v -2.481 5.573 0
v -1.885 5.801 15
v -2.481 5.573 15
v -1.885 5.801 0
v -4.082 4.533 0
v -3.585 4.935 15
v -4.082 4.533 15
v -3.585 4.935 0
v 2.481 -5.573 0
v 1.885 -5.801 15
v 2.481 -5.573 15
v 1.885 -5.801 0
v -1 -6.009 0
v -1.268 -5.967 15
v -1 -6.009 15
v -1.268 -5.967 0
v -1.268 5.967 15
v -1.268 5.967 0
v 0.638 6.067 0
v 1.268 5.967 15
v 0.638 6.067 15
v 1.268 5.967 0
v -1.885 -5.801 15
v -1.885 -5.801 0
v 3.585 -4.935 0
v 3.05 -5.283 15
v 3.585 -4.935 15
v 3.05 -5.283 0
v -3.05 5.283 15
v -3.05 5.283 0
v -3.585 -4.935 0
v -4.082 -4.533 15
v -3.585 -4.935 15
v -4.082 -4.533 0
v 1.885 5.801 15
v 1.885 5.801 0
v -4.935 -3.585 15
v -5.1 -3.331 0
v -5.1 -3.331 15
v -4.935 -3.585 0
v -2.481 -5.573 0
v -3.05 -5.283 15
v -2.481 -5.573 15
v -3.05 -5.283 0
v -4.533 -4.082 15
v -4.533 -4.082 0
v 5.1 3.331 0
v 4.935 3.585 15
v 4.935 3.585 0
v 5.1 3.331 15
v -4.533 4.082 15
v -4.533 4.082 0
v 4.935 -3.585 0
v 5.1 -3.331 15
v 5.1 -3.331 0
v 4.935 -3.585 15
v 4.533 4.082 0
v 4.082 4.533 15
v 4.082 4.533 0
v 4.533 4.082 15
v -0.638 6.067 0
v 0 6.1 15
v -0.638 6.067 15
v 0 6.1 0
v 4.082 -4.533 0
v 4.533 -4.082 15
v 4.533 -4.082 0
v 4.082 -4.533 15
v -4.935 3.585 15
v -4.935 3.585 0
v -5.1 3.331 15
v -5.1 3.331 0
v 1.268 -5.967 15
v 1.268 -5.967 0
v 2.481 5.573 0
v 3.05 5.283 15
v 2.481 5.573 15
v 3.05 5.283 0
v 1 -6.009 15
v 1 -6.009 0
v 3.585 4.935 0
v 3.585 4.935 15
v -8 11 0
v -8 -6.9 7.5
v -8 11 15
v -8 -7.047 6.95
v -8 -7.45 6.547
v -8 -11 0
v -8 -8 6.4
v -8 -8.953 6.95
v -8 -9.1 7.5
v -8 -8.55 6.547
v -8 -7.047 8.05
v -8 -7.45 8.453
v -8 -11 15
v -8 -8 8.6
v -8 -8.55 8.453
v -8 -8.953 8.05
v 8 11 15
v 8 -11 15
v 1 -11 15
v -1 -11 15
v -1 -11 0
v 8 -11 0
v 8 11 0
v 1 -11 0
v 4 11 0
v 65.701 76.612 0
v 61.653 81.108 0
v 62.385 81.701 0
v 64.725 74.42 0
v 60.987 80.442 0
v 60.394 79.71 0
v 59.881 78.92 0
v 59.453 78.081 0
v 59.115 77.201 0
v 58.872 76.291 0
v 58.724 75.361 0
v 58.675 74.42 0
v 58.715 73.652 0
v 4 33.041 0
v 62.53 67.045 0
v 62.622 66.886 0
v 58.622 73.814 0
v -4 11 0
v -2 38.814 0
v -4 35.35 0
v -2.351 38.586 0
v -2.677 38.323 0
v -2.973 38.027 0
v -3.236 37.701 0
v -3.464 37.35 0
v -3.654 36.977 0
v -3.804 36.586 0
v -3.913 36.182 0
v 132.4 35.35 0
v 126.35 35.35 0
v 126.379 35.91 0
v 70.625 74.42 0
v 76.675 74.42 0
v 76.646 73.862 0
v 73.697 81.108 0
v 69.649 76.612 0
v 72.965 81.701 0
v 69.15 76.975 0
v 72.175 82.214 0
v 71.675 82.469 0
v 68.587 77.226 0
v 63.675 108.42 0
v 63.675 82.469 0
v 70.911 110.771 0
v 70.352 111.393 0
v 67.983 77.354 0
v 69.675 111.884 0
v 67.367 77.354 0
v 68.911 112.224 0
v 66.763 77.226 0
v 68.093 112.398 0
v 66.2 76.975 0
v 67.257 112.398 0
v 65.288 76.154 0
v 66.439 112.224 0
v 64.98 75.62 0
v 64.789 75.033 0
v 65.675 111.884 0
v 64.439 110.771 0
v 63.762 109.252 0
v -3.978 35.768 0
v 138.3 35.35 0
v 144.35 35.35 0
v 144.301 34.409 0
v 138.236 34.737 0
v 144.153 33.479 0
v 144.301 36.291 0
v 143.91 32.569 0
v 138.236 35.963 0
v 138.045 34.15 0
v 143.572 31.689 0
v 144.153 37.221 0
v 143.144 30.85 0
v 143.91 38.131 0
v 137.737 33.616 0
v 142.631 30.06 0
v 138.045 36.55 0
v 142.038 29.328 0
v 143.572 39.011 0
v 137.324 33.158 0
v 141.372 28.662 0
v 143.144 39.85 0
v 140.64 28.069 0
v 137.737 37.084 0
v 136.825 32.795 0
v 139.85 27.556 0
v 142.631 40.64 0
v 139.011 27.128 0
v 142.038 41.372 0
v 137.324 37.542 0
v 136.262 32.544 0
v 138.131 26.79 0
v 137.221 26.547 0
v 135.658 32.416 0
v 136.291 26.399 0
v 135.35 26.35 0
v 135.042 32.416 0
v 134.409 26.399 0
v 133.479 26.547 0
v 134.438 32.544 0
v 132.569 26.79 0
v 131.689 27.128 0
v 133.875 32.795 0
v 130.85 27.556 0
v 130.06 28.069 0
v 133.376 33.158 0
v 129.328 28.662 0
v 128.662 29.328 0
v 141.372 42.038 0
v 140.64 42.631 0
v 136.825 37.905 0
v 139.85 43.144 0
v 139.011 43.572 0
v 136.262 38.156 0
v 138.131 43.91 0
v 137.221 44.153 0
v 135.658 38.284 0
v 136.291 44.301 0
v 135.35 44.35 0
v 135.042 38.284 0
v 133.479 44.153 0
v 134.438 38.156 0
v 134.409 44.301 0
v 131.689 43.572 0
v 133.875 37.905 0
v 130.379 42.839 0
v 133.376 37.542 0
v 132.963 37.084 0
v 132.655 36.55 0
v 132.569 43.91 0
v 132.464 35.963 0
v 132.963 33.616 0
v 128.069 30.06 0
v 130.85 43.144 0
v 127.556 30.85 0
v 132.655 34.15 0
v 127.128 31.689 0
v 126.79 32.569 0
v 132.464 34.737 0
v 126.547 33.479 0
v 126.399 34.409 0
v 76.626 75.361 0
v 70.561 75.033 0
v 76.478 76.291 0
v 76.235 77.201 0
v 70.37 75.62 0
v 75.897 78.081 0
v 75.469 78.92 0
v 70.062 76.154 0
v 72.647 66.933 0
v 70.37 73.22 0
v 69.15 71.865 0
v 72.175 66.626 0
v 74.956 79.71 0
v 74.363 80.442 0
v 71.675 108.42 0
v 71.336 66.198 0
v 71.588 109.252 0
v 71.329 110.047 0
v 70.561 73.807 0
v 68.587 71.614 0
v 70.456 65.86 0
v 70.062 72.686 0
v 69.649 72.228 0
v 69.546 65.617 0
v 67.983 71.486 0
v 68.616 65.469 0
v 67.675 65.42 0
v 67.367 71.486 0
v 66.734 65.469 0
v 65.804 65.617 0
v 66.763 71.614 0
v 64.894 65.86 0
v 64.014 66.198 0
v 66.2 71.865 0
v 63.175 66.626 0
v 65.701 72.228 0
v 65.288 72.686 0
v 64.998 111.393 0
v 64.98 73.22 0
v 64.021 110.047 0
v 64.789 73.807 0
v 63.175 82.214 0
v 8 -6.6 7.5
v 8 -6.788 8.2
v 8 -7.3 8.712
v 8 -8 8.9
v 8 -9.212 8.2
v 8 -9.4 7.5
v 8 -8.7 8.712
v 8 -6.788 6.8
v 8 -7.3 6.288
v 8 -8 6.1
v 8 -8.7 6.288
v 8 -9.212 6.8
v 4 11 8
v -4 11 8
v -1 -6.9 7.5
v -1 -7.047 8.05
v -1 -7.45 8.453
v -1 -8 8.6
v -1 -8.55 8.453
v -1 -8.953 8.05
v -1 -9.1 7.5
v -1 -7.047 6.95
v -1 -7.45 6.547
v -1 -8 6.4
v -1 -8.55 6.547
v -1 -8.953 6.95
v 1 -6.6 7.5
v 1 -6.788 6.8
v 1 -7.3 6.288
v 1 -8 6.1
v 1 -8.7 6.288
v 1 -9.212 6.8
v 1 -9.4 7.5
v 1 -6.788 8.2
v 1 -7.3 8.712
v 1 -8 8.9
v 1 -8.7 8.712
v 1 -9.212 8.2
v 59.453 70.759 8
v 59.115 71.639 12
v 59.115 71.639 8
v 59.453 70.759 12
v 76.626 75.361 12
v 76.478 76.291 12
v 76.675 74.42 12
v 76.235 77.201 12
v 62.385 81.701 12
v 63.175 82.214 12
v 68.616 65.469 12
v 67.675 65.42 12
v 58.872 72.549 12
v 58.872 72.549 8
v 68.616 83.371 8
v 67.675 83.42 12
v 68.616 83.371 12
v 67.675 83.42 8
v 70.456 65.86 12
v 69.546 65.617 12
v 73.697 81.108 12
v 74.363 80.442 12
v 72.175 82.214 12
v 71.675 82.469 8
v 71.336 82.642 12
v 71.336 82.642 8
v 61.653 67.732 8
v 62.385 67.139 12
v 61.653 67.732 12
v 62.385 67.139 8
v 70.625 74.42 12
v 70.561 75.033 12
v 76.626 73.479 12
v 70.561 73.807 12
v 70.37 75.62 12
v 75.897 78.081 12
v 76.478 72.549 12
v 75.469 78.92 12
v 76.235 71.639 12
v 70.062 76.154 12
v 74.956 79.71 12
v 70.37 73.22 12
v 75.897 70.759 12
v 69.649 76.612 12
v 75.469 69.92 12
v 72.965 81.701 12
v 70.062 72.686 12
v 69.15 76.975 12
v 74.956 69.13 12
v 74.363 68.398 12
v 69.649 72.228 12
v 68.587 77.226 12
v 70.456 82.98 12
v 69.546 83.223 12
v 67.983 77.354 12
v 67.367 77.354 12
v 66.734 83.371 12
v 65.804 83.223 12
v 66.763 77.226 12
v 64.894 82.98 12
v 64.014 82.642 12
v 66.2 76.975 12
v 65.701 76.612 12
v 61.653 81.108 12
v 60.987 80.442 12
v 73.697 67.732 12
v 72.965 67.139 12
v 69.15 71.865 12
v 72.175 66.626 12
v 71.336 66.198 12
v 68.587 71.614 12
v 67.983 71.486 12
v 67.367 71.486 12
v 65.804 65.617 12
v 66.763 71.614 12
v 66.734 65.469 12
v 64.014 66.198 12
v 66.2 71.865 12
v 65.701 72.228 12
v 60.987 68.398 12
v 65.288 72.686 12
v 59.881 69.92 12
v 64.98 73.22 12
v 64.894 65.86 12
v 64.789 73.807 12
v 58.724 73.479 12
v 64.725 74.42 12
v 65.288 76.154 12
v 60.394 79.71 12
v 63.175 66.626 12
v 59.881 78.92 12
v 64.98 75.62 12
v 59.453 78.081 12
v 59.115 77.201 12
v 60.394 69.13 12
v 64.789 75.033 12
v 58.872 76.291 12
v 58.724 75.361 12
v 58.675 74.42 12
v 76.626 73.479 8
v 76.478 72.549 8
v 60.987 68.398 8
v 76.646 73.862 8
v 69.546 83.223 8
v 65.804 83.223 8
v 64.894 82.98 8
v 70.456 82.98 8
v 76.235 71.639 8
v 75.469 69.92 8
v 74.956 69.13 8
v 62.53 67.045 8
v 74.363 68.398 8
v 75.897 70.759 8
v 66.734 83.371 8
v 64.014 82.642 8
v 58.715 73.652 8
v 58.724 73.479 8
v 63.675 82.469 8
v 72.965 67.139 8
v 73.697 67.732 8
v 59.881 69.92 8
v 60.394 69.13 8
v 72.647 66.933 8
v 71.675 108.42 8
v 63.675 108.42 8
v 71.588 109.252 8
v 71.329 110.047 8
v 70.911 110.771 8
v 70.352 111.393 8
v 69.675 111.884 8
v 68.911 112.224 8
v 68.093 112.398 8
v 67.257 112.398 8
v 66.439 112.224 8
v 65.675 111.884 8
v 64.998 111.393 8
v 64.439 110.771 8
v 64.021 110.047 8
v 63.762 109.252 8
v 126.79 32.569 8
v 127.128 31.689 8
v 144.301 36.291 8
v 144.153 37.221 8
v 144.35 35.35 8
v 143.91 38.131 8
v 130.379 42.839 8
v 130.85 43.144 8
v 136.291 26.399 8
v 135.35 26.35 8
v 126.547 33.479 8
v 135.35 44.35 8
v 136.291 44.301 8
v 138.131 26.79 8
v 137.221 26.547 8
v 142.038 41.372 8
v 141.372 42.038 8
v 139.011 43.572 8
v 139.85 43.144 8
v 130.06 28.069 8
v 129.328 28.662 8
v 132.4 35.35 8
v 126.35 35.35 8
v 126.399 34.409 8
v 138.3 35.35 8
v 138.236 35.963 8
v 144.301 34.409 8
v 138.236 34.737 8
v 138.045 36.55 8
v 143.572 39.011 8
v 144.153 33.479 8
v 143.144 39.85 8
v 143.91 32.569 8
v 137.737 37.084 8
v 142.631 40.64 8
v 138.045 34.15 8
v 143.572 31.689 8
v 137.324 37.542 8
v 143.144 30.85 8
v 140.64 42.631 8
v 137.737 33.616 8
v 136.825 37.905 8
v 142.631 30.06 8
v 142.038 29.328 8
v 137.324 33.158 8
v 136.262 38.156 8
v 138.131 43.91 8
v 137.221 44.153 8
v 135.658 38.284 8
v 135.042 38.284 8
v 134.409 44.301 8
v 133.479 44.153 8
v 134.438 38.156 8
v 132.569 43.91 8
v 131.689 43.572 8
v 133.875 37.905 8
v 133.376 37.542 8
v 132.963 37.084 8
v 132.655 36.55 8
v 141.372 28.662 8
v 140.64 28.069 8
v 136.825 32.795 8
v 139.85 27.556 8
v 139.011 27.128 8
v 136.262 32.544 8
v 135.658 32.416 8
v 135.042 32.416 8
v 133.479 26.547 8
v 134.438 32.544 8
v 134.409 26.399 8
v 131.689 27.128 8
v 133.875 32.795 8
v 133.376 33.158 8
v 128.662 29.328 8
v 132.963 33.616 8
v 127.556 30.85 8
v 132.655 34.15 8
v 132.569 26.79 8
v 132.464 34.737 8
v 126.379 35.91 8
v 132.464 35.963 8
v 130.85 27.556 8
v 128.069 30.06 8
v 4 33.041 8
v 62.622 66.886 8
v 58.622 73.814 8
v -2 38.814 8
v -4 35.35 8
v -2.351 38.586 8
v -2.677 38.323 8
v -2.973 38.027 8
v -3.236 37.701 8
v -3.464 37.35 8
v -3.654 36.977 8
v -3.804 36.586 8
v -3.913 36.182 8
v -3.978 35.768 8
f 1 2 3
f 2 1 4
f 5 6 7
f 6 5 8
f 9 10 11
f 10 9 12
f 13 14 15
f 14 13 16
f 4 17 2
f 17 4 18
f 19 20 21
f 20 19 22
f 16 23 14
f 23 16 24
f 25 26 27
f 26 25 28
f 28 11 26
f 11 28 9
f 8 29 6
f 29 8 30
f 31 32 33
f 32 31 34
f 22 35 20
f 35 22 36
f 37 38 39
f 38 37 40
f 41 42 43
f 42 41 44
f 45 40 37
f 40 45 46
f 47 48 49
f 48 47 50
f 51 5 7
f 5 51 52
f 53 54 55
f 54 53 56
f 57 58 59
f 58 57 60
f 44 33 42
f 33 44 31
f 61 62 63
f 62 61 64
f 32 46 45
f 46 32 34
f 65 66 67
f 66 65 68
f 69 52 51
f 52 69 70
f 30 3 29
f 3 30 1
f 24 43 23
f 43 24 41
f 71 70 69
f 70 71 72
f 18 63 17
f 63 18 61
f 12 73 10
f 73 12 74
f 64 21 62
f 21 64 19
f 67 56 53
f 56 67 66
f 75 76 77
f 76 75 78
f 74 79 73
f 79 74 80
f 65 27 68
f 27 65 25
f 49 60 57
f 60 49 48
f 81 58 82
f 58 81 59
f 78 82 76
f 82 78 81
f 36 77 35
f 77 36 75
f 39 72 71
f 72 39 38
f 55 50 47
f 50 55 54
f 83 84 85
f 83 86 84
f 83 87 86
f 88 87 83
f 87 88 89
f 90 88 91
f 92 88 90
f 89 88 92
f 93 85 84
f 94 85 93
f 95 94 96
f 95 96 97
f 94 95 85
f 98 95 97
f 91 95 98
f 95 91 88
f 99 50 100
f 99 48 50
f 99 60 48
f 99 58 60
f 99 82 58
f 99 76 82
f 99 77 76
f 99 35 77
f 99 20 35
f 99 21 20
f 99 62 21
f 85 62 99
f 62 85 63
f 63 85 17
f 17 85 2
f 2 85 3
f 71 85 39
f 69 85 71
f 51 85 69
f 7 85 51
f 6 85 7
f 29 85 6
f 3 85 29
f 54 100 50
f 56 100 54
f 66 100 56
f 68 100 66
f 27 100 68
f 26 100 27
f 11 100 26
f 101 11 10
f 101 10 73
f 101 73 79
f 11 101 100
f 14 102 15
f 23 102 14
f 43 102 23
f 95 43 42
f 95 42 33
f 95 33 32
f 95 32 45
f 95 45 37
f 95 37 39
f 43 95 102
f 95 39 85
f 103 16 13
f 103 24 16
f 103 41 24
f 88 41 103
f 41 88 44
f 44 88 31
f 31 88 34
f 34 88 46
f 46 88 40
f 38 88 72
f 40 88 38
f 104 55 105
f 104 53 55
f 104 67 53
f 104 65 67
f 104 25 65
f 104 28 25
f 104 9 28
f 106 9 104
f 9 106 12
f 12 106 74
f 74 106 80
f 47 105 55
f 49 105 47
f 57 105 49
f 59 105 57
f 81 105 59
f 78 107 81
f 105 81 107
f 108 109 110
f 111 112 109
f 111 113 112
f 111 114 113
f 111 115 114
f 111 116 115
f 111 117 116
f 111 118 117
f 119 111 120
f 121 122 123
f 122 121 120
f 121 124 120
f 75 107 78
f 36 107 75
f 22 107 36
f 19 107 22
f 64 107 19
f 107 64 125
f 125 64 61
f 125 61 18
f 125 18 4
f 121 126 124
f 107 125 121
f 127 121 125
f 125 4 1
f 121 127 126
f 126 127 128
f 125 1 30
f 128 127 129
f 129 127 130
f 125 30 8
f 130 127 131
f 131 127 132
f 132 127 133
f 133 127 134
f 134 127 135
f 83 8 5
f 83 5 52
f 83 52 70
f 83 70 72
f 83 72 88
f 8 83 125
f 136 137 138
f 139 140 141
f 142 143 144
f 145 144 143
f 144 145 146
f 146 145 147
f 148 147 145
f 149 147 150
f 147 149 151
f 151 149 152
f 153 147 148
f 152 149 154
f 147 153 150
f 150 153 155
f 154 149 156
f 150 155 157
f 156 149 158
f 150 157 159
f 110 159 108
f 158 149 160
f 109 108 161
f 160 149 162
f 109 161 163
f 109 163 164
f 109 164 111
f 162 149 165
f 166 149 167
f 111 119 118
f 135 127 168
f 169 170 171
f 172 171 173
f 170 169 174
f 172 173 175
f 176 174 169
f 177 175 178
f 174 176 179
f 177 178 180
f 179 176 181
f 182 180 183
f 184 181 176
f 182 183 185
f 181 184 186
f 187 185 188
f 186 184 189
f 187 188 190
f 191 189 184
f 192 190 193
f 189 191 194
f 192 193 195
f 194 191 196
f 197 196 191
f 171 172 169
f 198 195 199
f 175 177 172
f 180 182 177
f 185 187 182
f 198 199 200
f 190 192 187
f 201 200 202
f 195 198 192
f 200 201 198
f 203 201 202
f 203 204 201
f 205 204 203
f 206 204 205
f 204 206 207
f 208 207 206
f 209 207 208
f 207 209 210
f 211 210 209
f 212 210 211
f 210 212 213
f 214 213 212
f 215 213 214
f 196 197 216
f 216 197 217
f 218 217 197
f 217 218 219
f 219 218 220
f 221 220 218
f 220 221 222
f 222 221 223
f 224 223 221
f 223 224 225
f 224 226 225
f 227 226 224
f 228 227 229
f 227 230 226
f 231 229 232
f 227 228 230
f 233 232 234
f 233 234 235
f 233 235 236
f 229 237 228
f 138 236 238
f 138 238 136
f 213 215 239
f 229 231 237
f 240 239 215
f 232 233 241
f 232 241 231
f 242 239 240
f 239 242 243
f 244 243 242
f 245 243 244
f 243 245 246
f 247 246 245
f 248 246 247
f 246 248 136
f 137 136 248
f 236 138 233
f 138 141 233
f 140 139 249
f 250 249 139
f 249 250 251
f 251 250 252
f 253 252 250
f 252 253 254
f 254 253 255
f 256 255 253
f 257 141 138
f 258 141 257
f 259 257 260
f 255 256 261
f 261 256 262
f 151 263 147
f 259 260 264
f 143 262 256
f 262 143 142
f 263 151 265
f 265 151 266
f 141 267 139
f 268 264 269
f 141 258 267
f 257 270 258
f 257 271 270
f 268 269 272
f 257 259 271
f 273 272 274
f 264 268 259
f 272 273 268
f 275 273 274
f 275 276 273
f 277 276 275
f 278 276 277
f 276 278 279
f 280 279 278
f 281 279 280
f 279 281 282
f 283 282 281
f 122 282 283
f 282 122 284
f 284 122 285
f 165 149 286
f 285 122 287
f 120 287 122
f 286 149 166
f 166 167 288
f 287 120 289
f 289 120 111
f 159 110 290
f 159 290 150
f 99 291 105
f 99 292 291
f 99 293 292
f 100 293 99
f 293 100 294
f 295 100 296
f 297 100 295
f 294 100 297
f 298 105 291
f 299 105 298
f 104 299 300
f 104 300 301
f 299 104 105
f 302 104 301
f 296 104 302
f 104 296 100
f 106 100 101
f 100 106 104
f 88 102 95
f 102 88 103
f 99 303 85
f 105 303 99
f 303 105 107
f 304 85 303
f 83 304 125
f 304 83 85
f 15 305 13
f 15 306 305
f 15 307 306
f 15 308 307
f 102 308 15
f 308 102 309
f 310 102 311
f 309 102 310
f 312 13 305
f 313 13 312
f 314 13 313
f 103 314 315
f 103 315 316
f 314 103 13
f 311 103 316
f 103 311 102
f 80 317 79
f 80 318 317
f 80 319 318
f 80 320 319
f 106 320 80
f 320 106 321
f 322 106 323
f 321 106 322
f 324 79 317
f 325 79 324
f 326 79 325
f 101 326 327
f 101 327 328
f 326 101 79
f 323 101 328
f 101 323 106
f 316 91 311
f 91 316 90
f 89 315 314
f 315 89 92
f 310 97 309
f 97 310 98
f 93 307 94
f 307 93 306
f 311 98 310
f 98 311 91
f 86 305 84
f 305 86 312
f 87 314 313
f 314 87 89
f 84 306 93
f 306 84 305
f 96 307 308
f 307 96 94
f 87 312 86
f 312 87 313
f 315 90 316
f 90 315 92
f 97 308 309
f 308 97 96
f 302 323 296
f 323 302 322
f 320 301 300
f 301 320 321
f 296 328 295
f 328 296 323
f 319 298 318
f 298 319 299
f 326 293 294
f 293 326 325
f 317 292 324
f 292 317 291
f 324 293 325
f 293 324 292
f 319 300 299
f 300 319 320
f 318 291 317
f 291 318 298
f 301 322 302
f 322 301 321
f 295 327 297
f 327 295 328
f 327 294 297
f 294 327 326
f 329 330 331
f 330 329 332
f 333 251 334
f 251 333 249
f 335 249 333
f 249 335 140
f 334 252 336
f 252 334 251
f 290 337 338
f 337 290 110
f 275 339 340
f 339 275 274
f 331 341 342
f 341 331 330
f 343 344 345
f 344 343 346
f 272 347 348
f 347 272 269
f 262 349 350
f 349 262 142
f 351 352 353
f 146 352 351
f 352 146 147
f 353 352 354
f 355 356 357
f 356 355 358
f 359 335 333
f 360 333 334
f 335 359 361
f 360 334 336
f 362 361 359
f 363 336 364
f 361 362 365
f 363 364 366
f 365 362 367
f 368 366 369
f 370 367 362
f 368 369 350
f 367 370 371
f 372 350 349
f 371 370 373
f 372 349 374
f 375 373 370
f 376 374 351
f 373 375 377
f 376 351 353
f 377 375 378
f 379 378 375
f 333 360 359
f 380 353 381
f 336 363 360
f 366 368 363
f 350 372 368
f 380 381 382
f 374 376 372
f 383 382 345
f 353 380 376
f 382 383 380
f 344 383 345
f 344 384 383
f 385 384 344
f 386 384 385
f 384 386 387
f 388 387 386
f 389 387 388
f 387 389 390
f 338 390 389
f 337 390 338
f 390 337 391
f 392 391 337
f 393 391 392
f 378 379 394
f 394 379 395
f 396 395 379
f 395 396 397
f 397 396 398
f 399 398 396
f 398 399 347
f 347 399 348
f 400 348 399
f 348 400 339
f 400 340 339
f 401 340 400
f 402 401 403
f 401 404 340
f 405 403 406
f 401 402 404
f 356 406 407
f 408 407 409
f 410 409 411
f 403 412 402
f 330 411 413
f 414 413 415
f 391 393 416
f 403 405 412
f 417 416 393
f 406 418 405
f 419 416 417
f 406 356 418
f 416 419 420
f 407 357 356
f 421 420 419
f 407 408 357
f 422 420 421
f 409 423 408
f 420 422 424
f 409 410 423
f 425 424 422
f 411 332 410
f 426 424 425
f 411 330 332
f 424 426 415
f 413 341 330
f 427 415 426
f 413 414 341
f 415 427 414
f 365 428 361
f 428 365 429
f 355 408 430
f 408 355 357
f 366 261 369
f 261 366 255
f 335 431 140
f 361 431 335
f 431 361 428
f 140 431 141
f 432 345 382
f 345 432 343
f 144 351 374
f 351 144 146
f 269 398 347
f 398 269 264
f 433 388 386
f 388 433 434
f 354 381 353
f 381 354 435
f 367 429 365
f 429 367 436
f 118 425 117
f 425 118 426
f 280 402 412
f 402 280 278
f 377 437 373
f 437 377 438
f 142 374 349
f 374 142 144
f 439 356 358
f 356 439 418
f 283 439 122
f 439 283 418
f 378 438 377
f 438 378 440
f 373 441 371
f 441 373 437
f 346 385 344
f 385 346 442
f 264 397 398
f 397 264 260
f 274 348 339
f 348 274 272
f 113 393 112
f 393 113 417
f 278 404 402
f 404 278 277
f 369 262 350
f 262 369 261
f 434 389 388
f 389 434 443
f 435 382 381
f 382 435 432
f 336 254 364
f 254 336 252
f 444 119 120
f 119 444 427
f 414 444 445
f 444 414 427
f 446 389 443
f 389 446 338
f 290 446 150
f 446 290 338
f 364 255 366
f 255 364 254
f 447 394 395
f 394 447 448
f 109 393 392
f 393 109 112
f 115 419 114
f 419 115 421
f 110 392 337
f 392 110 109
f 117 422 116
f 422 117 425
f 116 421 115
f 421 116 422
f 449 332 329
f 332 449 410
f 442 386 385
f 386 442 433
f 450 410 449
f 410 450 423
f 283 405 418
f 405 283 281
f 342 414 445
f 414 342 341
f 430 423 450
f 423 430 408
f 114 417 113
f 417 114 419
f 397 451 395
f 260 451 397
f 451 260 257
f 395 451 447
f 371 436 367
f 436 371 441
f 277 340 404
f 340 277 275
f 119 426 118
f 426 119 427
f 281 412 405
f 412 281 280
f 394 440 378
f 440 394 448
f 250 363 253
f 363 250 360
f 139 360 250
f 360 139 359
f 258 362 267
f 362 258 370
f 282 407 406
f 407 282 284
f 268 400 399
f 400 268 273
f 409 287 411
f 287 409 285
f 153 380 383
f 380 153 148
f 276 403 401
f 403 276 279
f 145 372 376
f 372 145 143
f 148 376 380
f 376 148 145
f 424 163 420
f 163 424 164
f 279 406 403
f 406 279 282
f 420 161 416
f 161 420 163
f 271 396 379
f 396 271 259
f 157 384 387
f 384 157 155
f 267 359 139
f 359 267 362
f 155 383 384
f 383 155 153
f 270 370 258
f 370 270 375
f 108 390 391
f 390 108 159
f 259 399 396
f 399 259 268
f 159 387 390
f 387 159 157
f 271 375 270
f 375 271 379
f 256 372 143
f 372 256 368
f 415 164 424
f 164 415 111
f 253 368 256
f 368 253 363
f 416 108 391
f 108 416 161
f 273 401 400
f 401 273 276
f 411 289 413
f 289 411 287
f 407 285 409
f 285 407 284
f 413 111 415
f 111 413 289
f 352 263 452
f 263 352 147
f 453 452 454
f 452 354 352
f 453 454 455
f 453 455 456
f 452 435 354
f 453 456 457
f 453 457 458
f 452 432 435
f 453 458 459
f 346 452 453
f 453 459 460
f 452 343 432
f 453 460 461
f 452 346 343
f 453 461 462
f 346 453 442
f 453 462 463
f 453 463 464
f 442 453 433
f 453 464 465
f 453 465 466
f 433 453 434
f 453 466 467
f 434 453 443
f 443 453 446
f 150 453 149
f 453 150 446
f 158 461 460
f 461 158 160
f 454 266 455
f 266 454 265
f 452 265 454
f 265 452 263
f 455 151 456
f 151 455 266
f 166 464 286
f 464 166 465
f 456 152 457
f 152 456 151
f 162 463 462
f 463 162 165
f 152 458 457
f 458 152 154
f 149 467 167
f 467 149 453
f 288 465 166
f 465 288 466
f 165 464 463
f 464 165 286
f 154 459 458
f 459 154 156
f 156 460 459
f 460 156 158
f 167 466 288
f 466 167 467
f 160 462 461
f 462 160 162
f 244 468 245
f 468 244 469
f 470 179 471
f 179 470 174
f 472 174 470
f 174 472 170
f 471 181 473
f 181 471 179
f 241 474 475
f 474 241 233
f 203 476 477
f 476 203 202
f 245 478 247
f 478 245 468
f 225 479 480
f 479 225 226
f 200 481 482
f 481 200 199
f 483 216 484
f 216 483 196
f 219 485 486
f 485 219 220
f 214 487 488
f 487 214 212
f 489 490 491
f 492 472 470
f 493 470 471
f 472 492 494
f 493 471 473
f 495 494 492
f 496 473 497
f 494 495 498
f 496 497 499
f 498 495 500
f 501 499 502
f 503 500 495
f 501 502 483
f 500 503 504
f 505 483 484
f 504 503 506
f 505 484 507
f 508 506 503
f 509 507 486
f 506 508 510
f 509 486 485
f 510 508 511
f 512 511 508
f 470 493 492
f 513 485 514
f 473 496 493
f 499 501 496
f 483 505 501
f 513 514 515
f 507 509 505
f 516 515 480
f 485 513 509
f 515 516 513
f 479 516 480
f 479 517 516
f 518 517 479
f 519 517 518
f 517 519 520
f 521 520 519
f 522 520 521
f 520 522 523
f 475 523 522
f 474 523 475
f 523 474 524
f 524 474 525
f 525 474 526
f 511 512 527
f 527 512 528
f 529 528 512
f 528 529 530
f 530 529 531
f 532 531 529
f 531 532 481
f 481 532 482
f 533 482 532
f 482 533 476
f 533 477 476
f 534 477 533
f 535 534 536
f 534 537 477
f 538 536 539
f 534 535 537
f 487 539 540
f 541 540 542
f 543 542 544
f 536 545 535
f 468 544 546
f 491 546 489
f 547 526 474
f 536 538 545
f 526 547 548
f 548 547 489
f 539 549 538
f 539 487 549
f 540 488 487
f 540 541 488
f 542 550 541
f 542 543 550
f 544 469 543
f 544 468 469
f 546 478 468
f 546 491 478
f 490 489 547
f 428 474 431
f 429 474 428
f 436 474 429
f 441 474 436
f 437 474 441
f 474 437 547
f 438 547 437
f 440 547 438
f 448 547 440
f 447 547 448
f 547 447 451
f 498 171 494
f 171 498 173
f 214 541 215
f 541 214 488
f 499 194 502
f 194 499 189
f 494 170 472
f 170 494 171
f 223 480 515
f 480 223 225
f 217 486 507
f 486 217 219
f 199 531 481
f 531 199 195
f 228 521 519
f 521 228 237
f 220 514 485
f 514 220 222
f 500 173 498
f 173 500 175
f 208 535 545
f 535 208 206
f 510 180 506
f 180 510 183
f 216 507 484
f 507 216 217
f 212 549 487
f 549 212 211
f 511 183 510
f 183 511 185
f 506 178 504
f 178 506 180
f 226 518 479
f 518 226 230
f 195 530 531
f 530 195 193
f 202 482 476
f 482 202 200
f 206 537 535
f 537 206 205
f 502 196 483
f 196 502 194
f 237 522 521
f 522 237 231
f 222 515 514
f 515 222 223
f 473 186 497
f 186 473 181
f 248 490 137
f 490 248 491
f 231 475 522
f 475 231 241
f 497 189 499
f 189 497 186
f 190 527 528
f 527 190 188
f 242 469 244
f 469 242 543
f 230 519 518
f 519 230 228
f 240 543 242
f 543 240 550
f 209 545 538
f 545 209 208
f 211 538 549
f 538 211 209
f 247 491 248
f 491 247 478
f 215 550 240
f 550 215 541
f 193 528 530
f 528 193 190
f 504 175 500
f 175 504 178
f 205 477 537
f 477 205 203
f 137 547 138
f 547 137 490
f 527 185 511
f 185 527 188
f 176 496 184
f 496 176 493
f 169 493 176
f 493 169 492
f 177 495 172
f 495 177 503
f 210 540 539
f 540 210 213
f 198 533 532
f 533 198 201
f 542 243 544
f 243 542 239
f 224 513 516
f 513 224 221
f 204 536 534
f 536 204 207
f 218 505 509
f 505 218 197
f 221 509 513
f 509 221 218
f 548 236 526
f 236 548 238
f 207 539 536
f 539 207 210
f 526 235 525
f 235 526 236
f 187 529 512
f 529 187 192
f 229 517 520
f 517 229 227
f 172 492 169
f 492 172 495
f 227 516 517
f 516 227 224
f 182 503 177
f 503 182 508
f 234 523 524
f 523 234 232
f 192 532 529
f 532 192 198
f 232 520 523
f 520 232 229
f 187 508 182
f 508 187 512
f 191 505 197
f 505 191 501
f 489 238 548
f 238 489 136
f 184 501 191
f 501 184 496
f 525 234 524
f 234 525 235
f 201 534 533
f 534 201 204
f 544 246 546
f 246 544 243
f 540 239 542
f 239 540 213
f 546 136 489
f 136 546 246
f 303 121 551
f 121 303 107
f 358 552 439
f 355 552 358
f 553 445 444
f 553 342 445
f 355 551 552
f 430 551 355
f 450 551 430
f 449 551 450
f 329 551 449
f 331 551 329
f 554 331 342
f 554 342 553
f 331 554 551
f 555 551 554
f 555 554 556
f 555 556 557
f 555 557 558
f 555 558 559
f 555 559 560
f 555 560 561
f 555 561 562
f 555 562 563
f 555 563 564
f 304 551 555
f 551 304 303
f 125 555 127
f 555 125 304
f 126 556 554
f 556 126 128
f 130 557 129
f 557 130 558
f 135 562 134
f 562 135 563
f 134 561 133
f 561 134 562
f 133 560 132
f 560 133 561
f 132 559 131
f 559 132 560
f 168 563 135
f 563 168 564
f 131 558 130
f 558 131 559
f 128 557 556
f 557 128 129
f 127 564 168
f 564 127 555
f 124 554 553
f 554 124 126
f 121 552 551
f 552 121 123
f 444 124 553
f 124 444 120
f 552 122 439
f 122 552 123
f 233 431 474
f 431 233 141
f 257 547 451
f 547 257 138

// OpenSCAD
translate([-4,10,0])cube([8,25.35,8]);
translate([0,35.35,0])cylinder(d=8,h=8,$fn=60);
rotate([0,0,180])wheel_bracket();

translate([0,35.35,0])rotate([0,0,30])
translate([0,-4,0])cube([70,8,8]);
translate([135.35/2,35.35+39.07,0])
difference(){
cylinder(d=18,h=12,$fn=60);
translate([0,0,-1])cylinder(d=5.9,h=20,$fn=30);
}

translate([135.35/2-4,35.35+39.07+4,0])
{
cube([8,30,8]);
translate([4,30,0])cylinder(d=8,h=8,$fn=30);
}


translate([135.35,35.35,0])rotate([0,0,150])
translate([8,-4,0])cube([65,8,8]);
translate([135.35,35.35,0])
difference(){
cylinder(d=18,h=8,$fn=60);
translate([0,0,-1])cylinder(d=5.9,h=20,$fn=30);
}

module wheel_bracket(){
    difference(){
translate([-8,-11,0])cube([16,22,15]);
difference(){
    translate([0,0,-1])cylinder(d=12.2,h=25,$fn=60);
    translate([6.1,0,-1])cube([2,16,40],center=true);
    translate([-6.1,0,-1])cube([2,16,40],center=true);
}
translate([-1,0,-1])cube([2,22,25]);
translate([-9,8,7.5])rotate([0,90,0])
cylinder(d=2.2,h=21,$fn=12);
translate([-9,8,7.5])rotate([0,90,0])
cylinder(d=2.8,h=10,$fn=12);
}
}
